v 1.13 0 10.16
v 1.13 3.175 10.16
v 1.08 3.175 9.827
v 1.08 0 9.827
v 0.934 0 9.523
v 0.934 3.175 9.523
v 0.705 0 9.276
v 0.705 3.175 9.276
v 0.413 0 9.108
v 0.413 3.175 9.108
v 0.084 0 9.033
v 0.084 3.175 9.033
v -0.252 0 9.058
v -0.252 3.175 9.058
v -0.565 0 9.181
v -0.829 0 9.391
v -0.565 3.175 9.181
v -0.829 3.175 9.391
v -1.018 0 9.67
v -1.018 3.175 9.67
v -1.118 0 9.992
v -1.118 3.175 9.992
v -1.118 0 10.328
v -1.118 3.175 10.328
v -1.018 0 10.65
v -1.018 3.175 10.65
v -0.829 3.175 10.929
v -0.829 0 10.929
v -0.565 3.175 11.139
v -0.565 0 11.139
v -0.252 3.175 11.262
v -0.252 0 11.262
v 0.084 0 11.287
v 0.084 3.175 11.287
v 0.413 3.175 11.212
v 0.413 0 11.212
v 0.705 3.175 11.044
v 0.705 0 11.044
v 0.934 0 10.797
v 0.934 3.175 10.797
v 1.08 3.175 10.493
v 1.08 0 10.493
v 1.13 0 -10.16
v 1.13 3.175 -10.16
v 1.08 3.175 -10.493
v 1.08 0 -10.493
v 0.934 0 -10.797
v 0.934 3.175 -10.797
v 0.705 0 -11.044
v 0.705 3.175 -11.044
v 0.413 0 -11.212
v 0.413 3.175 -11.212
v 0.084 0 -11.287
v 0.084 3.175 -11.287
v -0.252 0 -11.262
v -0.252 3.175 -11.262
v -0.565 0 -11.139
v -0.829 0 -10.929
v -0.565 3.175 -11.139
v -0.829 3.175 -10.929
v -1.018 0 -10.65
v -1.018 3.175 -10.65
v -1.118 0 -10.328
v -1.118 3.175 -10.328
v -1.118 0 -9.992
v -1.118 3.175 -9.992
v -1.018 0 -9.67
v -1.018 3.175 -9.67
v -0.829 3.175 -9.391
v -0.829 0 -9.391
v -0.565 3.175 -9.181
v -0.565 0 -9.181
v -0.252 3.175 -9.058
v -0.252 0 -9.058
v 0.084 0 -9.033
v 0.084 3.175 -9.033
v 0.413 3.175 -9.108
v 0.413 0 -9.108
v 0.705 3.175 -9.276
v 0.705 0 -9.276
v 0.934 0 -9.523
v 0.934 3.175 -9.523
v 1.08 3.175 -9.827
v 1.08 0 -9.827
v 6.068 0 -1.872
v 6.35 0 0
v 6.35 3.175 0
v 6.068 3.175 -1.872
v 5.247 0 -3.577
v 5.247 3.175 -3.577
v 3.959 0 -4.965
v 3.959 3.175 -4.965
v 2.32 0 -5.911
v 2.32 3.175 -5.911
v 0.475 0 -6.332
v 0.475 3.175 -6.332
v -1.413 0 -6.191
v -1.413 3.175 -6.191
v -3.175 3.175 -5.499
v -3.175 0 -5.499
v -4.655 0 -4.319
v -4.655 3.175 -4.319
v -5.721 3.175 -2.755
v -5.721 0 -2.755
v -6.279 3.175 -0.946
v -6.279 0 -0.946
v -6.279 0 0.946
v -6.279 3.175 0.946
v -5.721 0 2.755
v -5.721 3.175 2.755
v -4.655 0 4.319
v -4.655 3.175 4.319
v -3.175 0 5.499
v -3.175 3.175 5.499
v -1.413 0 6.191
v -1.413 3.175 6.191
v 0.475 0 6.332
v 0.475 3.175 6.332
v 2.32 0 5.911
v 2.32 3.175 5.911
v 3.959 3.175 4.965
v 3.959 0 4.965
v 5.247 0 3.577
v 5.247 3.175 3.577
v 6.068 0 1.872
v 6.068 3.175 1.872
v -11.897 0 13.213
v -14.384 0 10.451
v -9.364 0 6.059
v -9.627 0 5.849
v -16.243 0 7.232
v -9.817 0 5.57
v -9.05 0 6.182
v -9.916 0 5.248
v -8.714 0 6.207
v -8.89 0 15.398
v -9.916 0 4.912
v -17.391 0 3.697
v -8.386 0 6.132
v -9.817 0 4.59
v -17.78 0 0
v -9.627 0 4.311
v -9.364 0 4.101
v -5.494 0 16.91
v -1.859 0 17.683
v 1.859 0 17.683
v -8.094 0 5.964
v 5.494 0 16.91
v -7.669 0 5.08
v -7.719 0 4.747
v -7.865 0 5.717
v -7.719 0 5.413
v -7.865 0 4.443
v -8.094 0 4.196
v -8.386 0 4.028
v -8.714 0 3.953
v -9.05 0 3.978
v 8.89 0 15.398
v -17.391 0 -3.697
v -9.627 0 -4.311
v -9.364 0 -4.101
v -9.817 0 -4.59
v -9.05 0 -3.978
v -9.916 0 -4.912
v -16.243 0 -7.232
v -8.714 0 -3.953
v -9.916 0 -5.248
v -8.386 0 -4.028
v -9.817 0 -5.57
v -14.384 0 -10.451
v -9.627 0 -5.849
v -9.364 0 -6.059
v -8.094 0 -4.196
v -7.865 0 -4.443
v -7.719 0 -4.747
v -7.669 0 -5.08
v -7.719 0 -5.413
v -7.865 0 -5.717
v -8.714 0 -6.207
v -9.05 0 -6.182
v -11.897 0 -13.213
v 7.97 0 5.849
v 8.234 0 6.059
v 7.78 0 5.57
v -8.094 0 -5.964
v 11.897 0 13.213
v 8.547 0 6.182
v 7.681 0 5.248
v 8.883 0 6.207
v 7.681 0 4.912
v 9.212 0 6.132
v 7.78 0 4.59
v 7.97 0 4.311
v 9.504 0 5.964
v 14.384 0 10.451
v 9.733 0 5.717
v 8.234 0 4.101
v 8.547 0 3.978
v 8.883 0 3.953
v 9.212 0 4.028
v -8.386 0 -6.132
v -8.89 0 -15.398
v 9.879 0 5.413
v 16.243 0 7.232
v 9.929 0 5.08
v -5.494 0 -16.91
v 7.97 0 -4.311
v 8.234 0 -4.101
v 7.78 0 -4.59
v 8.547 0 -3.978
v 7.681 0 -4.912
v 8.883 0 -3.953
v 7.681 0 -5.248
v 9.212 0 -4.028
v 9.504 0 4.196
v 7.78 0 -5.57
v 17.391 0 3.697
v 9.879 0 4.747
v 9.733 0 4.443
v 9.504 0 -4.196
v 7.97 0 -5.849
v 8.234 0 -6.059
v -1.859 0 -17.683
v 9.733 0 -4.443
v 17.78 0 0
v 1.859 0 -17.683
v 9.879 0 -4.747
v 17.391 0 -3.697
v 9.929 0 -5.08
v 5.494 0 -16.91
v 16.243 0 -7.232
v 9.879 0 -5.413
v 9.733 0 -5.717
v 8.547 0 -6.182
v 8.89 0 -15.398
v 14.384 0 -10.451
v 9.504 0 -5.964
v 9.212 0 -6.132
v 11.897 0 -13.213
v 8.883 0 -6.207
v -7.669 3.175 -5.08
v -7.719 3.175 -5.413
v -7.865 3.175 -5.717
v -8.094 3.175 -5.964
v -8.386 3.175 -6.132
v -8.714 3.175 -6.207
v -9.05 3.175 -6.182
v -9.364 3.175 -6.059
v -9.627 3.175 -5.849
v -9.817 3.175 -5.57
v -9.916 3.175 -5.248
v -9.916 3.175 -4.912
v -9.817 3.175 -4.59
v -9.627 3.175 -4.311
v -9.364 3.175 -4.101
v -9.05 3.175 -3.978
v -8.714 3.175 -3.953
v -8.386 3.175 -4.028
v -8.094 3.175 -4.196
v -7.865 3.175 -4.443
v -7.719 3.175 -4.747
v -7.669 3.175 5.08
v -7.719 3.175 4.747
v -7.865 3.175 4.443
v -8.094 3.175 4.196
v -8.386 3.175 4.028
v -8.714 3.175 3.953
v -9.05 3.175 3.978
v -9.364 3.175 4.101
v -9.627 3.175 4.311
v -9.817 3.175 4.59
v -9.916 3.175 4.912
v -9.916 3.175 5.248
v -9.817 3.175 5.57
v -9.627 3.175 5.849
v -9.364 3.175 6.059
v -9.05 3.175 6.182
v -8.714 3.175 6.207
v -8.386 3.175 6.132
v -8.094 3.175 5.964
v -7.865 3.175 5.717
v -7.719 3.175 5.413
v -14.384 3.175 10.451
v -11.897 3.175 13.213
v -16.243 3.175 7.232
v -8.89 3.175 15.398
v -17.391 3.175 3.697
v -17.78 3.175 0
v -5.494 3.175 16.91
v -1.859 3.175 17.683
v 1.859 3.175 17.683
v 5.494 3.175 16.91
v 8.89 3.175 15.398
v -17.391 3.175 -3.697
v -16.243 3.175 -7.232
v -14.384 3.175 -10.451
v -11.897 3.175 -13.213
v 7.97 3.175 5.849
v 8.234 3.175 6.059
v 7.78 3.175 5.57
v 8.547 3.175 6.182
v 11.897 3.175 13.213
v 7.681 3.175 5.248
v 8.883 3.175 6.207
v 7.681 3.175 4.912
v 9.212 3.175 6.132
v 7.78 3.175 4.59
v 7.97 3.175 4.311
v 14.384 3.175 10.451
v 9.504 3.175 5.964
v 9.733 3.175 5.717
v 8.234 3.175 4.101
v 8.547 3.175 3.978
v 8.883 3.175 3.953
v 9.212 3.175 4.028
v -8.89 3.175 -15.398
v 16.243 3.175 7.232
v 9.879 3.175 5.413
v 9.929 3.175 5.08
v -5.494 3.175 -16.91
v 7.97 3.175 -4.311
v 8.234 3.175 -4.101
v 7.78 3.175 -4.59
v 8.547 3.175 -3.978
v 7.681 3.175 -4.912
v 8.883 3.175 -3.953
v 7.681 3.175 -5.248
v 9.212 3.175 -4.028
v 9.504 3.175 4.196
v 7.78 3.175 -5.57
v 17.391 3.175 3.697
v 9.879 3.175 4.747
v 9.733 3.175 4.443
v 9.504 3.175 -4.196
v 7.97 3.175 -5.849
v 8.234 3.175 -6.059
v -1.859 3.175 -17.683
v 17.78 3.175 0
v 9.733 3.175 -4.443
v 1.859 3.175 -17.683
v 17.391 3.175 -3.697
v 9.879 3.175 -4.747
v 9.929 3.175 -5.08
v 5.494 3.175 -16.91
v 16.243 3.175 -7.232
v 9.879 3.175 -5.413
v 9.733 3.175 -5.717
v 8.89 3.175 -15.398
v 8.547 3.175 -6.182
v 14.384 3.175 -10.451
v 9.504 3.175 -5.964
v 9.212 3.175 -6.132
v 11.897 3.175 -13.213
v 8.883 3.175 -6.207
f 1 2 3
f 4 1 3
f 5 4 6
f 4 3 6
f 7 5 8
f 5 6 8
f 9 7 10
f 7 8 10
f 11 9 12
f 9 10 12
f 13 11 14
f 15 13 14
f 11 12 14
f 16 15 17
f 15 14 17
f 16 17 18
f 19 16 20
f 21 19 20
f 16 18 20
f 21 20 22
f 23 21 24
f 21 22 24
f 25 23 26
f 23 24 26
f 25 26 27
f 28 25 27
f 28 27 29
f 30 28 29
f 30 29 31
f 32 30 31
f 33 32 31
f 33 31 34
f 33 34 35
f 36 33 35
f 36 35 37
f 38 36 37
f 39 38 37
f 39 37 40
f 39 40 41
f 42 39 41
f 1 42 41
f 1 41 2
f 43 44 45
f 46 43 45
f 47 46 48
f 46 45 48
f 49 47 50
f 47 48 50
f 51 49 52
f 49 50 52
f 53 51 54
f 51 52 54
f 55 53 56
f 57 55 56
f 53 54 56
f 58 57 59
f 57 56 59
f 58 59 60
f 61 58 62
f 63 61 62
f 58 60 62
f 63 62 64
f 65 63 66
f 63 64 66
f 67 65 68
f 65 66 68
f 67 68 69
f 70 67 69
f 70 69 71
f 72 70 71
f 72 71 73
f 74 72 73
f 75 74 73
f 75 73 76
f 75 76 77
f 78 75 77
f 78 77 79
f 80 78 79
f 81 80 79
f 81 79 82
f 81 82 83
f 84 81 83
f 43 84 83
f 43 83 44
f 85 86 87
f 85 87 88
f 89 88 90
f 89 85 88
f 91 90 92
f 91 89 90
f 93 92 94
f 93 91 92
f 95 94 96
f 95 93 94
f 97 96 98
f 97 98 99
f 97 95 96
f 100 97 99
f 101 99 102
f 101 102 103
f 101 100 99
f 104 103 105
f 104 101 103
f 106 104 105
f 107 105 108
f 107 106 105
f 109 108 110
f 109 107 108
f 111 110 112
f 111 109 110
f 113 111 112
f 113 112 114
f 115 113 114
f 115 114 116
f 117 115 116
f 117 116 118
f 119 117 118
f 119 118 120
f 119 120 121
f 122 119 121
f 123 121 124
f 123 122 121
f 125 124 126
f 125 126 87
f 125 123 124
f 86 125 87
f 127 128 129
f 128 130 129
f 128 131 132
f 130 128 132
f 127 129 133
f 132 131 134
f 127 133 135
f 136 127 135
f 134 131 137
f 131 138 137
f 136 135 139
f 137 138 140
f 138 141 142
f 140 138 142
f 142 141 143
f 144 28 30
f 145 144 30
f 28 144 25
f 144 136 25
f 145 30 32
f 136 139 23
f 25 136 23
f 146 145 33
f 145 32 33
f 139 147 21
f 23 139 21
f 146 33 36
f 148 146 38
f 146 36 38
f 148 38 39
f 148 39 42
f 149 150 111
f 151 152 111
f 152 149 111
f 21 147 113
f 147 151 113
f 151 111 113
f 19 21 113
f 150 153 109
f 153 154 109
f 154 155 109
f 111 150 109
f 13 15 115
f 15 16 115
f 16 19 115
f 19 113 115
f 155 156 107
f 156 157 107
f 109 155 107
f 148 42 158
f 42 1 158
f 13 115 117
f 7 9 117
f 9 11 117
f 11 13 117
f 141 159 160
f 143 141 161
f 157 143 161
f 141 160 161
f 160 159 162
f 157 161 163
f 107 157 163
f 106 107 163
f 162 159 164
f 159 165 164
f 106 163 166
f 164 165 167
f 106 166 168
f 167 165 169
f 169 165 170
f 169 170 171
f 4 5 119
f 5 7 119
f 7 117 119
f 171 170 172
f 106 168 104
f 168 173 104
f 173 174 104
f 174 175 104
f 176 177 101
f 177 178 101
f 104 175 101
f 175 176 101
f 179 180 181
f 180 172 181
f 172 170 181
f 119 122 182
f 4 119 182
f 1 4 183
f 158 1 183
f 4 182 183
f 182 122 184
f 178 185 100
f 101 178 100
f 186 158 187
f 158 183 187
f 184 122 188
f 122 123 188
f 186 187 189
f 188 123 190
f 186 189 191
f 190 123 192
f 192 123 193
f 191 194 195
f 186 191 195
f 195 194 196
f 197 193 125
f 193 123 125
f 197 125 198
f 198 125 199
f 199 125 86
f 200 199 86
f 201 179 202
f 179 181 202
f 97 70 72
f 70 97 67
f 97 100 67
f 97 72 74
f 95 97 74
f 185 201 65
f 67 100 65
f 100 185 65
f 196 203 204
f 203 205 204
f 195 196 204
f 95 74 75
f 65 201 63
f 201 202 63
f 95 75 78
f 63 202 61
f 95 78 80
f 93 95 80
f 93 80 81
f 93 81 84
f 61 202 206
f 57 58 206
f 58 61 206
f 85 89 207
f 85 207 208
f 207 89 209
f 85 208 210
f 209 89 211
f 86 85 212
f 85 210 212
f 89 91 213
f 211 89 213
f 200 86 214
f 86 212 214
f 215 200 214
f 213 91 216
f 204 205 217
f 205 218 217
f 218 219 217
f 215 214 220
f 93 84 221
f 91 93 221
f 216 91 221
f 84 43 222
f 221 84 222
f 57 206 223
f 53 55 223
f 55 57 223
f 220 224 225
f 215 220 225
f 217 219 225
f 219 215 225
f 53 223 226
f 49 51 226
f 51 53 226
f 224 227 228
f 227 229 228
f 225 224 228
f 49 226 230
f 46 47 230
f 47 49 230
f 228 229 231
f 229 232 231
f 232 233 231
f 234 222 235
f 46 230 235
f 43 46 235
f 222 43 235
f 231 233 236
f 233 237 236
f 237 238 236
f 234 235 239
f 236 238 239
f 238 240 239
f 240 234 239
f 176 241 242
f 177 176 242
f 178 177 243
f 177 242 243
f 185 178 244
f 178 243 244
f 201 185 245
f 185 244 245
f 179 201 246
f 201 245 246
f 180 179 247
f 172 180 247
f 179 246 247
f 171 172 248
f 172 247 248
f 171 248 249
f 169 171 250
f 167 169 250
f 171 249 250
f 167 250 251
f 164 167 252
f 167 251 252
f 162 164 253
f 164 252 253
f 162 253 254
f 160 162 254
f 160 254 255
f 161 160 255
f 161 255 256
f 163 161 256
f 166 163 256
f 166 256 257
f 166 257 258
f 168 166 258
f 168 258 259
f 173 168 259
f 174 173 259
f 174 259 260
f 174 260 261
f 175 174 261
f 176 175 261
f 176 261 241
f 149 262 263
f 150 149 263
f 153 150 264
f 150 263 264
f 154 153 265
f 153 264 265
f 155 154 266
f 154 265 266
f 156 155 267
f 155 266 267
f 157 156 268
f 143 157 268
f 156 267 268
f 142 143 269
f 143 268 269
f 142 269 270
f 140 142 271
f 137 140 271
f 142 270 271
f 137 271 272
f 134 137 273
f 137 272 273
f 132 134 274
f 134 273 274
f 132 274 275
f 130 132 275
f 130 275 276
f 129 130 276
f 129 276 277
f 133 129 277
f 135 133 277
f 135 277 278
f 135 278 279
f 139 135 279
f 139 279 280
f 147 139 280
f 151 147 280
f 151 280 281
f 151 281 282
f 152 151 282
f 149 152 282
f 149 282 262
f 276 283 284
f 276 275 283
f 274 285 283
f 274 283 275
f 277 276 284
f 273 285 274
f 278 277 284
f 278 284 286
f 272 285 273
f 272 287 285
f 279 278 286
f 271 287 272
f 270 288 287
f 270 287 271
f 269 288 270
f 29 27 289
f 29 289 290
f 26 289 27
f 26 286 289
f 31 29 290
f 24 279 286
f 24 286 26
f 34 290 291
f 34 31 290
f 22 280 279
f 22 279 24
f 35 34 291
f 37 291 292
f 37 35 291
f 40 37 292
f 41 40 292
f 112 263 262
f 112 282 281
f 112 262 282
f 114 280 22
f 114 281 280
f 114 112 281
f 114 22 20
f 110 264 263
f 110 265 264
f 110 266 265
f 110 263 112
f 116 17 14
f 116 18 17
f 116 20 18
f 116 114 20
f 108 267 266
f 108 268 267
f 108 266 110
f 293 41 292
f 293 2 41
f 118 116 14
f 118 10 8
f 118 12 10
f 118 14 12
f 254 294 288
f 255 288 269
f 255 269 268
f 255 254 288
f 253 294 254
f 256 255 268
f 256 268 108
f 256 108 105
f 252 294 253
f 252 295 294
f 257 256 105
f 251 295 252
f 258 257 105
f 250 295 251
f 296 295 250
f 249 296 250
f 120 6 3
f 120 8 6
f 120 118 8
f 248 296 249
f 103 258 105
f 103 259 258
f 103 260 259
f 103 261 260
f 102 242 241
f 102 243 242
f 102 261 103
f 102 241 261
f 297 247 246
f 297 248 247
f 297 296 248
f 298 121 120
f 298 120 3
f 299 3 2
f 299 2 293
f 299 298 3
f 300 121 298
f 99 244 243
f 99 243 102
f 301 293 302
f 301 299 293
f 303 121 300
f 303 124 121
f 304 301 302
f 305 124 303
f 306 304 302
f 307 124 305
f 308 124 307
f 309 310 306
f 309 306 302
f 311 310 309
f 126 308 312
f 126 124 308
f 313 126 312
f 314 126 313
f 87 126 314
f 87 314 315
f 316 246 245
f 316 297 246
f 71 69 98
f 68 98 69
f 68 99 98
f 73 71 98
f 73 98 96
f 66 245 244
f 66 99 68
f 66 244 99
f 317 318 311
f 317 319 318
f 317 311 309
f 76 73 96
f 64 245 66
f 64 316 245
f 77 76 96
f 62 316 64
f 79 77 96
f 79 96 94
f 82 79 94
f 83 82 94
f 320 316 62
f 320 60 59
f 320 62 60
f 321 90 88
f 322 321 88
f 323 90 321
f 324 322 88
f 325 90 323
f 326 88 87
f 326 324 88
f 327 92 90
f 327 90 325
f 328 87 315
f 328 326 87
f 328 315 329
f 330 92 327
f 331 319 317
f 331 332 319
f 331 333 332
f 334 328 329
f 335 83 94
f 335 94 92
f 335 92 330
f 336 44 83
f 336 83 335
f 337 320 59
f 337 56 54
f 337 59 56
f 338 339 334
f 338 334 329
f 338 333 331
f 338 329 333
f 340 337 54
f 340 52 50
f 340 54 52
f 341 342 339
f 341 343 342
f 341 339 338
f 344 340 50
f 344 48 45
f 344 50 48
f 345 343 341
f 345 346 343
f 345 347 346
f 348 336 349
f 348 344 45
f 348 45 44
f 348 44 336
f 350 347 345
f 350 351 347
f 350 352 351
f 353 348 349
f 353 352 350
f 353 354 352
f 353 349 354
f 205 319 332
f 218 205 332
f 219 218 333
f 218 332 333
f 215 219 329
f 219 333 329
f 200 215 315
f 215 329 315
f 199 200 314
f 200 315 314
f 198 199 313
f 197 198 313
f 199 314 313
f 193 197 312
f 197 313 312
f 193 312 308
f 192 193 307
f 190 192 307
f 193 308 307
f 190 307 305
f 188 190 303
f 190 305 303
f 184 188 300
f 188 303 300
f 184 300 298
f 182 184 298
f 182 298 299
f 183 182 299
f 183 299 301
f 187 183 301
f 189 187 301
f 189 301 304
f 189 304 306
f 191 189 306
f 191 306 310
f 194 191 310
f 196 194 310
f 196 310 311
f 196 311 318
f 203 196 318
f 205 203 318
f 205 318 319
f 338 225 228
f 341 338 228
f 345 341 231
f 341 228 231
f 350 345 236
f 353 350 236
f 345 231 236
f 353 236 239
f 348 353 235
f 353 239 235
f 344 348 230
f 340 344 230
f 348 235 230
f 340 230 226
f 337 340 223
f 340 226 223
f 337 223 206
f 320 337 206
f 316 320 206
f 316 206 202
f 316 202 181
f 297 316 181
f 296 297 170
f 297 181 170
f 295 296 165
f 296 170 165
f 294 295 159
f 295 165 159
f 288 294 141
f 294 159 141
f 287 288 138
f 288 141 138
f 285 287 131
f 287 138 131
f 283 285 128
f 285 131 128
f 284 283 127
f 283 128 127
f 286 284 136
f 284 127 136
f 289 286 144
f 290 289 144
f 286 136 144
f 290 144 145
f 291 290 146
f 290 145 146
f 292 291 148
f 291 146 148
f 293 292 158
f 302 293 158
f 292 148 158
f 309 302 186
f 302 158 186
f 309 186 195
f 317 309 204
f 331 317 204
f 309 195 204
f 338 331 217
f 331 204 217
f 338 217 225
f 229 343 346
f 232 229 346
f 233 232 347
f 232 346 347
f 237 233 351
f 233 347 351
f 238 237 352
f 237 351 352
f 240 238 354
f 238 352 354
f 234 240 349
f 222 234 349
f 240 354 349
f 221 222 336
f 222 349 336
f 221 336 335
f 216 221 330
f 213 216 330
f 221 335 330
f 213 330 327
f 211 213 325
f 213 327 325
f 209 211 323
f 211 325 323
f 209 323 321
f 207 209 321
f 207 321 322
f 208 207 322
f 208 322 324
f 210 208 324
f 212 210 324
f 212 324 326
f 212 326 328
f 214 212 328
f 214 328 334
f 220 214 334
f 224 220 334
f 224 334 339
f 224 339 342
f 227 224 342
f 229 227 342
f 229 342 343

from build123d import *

# Parameters (mm, degrees)
SKETCH1_R                 = 17.78
SKETCH1_R_2               = 6.35
BOSS_EXTRUDE1_DEPTH       = 3.175
TAP_DRILL_FOR_4_40_TAP1_D = 2.2606


with BuildPart() as part:
    # Sketch1 → Boss-Extrude1 (new body)
    with BuildSketch(Plane(origin=(0, 0, 0), x_dir=(1, 0, 0), z_dir=(0, 1, 0))):
        Circle(SKETCH1_R)
        Circle(SKETCH1_R_2, mode=Mode.SUBTRACT)
    extrude(amount=BOSS_EXTRUDE1_DEPTH)

    # Tap Drill for #4-40 Tap1 (through all)
    with Locations(Plane(origin=(0, 0, 0), x_dir=(-1, 0, 0), z_dir=(0, -1, 0))):
        with Locations((0, -10.16), (-8.798818102, -5.08), (-8.798818102, 5.08), (0, 10.16), (8.798818102, 5.08), (8.798818102, -5.08)):
            Hole(TAP_DRILL_FOR_4_40_TAP1_D / 2)


solid = part.part
